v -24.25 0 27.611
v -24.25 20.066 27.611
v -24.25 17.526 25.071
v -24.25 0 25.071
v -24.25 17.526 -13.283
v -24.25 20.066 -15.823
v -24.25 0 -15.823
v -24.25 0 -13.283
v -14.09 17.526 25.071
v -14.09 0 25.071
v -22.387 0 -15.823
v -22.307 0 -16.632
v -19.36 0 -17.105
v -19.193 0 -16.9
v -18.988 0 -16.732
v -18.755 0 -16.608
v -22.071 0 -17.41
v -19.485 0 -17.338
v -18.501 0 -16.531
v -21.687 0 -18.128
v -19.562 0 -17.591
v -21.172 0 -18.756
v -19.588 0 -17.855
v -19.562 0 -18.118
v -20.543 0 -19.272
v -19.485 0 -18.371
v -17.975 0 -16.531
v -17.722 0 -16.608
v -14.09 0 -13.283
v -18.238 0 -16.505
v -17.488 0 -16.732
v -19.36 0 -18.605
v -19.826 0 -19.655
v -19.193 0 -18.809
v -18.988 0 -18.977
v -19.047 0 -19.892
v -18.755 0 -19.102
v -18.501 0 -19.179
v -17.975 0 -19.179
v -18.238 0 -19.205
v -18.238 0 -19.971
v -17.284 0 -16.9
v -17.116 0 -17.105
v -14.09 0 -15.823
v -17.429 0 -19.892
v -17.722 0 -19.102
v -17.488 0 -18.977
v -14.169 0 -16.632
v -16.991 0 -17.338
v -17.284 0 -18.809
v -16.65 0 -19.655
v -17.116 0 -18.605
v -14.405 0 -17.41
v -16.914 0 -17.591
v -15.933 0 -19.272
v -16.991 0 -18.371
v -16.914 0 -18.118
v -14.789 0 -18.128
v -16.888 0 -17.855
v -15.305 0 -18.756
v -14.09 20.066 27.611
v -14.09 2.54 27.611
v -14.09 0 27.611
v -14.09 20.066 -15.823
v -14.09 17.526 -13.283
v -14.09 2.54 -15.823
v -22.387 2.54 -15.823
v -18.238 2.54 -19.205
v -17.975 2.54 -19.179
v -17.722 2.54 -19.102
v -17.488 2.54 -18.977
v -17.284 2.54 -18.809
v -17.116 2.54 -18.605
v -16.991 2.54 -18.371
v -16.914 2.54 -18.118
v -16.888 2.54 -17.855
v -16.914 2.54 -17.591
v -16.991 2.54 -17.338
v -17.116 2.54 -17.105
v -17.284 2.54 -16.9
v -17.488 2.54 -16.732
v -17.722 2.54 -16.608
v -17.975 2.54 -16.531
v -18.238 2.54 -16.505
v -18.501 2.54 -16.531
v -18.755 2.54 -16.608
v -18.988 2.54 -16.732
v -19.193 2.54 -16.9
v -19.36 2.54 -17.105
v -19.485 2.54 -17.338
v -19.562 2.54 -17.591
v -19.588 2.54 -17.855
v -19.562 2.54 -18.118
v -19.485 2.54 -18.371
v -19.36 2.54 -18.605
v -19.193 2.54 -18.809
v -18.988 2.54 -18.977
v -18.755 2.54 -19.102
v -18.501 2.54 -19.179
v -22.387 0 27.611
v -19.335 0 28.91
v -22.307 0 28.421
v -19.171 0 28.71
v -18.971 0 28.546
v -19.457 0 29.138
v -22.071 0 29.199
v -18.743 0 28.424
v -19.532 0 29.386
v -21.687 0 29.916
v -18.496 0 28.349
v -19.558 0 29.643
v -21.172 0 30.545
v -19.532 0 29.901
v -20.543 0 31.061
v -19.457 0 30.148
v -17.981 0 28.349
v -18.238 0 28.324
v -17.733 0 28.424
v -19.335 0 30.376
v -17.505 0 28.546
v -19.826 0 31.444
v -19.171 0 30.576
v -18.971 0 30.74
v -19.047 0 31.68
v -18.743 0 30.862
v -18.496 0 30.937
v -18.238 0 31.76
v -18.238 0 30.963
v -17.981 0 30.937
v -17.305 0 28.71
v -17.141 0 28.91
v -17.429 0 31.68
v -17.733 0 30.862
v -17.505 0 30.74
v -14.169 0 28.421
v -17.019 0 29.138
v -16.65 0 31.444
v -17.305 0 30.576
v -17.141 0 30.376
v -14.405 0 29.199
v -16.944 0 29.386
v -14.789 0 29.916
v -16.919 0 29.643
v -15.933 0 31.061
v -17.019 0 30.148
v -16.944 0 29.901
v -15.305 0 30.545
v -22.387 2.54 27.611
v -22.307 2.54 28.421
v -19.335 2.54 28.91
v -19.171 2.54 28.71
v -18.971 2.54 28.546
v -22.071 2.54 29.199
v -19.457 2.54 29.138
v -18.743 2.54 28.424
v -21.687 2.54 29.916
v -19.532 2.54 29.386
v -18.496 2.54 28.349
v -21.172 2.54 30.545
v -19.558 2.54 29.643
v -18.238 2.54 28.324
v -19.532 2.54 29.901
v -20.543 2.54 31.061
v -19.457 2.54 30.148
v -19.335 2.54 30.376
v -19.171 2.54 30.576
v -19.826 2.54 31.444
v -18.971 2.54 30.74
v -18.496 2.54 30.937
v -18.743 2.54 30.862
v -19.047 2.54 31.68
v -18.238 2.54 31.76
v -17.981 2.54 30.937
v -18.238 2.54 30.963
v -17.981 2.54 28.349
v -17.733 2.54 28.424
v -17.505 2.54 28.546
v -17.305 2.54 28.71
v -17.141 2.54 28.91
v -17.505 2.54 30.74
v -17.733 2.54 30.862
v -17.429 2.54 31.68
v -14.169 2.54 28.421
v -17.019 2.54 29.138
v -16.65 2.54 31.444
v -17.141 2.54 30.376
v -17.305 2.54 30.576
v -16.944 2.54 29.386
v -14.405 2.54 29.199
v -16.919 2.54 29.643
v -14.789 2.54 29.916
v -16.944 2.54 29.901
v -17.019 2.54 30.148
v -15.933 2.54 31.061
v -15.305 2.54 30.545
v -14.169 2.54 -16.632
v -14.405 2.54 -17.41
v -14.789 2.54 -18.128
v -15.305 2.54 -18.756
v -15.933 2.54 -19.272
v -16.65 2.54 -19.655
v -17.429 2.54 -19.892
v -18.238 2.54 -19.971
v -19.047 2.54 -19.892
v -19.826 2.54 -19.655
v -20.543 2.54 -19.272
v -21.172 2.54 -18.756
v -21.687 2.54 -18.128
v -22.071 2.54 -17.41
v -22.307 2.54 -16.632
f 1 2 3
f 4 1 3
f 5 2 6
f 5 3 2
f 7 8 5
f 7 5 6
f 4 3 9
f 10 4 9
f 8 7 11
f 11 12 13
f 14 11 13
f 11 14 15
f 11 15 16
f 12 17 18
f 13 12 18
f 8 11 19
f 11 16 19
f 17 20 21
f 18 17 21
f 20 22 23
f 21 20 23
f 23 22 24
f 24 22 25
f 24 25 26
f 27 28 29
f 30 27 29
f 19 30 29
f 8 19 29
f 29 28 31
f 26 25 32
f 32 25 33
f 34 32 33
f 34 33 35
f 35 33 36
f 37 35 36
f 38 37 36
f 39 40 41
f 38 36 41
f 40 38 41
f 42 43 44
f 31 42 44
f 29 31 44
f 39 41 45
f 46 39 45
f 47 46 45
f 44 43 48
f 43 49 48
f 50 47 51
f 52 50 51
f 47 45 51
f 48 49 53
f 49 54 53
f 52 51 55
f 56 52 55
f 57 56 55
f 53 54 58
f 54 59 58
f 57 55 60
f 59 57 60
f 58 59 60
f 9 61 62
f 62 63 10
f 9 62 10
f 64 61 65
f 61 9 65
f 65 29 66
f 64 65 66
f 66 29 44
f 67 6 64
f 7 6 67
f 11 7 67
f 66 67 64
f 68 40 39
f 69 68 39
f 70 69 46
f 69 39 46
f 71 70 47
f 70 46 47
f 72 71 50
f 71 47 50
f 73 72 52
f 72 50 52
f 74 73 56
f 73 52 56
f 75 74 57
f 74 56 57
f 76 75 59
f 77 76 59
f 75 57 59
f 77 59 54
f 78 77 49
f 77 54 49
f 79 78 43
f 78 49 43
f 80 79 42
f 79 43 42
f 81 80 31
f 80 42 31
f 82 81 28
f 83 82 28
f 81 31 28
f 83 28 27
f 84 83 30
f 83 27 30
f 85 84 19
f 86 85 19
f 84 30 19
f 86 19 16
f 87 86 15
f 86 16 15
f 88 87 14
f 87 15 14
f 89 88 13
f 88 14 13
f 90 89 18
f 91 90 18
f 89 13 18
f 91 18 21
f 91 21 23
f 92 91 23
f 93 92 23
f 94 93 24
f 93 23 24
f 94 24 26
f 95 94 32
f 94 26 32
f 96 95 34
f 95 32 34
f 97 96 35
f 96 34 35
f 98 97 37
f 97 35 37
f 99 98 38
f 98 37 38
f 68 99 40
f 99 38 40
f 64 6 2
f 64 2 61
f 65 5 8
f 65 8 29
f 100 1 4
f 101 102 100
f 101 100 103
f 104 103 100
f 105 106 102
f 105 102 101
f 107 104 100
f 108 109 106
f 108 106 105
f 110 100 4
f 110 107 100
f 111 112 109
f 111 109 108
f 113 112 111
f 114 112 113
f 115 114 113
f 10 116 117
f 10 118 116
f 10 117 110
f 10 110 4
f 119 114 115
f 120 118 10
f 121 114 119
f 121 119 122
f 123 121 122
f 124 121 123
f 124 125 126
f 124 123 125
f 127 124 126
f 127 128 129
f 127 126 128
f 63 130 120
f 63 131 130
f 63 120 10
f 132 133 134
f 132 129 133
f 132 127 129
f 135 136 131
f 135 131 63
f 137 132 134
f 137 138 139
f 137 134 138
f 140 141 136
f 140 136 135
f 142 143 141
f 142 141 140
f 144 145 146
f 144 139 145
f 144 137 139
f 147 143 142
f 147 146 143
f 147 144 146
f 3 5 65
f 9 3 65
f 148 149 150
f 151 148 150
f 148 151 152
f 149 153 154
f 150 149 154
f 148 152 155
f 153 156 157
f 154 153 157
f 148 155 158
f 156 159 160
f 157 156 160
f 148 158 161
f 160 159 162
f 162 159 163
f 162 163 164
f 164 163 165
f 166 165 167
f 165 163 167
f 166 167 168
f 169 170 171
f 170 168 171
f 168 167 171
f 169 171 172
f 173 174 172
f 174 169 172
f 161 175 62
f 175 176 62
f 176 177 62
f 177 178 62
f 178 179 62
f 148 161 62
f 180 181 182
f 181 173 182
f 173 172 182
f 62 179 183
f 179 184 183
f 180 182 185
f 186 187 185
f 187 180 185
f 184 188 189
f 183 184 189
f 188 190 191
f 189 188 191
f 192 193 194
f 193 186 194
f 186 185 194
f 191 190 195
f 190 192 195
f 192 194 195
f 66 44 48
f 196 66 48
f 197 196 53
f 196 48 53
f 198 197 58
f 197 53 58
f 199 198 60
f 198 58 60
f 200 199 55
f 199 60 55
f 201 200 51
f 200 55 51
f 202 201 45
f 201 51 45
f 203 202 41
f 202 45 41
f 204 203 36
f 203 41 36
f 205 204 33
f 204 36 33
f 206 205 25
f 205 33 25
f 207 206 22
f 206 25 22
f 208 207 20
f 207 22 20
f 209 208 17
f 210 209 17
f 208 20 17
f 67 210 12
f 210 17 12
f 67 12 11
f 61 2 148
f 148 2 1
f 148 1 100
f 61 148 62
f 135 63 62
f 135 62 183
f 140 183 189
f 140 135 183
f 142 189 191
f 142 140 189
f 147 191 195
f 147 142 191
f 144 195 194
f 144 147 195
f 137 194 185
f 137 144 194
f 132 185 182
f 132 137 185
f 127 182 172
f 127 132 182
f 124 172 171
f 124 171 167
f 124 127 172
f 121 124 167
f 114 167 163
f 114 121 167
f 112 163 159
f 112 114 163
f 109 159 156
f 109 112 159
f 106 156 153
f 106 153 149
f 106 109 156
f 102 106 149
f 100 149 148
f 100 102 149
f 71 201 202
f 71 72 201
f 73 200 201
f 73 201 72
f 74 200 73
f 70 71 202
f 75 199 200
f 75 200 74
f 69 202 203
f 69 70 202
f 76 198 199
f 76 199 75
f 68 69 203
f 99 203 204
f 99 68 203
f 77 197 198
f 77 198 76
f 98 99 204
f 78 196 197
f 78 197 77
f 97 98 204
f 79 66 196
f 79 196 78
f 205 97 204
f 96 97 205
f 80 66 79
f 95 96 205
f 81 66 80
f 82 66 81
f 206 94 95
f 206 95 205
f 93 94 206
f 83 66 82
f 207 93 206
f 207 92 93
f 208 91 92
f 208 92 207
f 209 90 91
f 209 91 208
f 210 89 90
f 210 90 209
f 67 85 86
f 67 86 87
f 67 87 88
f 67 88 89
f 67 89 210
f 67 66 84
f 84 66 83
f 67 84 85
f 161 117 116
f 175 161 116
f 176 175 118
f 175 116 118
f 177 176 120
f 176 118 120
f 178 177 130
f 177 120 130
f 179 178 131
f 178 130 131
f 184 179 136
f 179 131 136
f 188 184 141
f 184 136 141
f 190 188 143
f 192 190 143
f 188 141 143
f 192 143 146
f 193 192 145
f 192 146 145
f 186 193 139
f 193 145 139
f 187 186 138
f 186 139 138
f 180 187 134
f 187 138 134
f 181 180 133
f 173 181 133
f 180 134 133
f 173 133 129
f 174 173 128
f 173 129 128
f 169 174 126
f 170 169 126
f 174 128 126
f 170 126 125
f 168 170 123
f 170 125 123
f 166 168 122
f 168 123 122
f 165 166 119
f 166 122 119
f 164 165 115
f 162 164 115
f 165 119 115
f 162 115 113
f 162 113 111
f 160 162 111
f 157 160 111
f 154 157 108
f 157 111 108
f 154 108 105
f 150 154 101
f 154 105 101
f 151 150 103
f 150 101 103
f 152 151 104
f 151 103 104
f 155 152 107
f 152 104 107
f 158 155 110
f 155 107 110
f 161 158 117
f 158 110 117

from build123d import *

# Parameters (mm, degrees)
SKETCH1_W             = 10.16
SKETCH1_H             = 2.54
BOSS_EXTRUDE1_DEPTH   = 17.526
BOSS_EXTRUDE1_2_DEPTH = 17.526
SKETCH2_W             = 10.16
SKETCH2_H             = 43.434
BOSS_EXTRUDE2_DEPTH   = 2.54
SKETCH3_R             = 1.319522672
SKETCH3_R_2           = 1.34985913
BOSS_EXTRUDE3_DEPTH   = 2.54


with BuildPart() as part:
    # Sketch1 → Boss-Extrude1 (new body)
    with BuildSketch(Plane(origin=(0, 0, 0), x_dir=(1, 0, 0), z_dir=(0, 1, 0))):
        with Locations((-19.169529412, 14.552705882)):
            Rectangle(SKETCH1_W, SKETCH1_H)
    extrude(amount=BOSS_EXTRUDE1_DEPTH)



with BuildPart() as body_2:
    # Sketch1 → Boss-Extrude1 2 (new body)
    with BuildSketch(Plane(origin=(0, 0, 0), x_dir=(1, 0, 0), z_dir=(0, 1, 0))):
        with Locations((-19.169529412, -26.341294118)):
            Rectangle(SKETCH1_W, SKETCH1_H)
    extrude(amount=BOSS_EXTRUDE1_2_DEPTH)


with BuildPart() as part_1:
    add(part.part)

    add(body_2.part)  # Boss-Extrude2 merges body 2
    # Sketch2 → Boss-Extrude2 (add)
    with BuildSketch(Plane(origin=(0, 17.526, 0), x_dir=(1, 0, 0), z_dir=(0, 1, 0))):
        with Locations((-19.169529412, -5.894294118)):
            Rectangle(SKETCH2_W, SKETCH2_H)
    extrude(amount=BOSS_EXTRUDE2_DEPTH)

    # Sketch3 → Boss-Extrude3 (add)
    # profile 1 of 2: a face of its own
    with BuildSketch(Plane.XZ):
        with BuildLine():
            Line((-22.386628374, 27.611294118), (-14.089529412, 27.611294118))
            ThreePointArc((-14.089529412, 27.611294118), (-18.238078893, 31.759843599), (-22.386628374, 27.611294118))
        make_face()
        with Locations(Location((-18.238078893, 29.643294118, 0), (0, 0, 270))):
            Circle(SKETCH3_R, mode=Mode.SUBTRACT)
    # profile 2 of 2: a face of its own
    with BuildSketch(Plane.XZ):
        with BuildLine():
            Line((-22.386628374, -15.822705882), (-14.089529412, -15.822705882))
            ThreePointArc((-14.089529412, -15.822705882), (-18.238078893, -19.971255363), (-22.386628374, -15.822705882))
        make_face()
        with Locations(Location((-18.238078893, -17.854705882, 0), (0, 0, 270))):
            Circle(SKETCH3_R_2, mode=Mode.SUBTRACT)
    extrude(amount=-BOSS_EXTRUDE3_DEPTH)


solid = part_1.part
